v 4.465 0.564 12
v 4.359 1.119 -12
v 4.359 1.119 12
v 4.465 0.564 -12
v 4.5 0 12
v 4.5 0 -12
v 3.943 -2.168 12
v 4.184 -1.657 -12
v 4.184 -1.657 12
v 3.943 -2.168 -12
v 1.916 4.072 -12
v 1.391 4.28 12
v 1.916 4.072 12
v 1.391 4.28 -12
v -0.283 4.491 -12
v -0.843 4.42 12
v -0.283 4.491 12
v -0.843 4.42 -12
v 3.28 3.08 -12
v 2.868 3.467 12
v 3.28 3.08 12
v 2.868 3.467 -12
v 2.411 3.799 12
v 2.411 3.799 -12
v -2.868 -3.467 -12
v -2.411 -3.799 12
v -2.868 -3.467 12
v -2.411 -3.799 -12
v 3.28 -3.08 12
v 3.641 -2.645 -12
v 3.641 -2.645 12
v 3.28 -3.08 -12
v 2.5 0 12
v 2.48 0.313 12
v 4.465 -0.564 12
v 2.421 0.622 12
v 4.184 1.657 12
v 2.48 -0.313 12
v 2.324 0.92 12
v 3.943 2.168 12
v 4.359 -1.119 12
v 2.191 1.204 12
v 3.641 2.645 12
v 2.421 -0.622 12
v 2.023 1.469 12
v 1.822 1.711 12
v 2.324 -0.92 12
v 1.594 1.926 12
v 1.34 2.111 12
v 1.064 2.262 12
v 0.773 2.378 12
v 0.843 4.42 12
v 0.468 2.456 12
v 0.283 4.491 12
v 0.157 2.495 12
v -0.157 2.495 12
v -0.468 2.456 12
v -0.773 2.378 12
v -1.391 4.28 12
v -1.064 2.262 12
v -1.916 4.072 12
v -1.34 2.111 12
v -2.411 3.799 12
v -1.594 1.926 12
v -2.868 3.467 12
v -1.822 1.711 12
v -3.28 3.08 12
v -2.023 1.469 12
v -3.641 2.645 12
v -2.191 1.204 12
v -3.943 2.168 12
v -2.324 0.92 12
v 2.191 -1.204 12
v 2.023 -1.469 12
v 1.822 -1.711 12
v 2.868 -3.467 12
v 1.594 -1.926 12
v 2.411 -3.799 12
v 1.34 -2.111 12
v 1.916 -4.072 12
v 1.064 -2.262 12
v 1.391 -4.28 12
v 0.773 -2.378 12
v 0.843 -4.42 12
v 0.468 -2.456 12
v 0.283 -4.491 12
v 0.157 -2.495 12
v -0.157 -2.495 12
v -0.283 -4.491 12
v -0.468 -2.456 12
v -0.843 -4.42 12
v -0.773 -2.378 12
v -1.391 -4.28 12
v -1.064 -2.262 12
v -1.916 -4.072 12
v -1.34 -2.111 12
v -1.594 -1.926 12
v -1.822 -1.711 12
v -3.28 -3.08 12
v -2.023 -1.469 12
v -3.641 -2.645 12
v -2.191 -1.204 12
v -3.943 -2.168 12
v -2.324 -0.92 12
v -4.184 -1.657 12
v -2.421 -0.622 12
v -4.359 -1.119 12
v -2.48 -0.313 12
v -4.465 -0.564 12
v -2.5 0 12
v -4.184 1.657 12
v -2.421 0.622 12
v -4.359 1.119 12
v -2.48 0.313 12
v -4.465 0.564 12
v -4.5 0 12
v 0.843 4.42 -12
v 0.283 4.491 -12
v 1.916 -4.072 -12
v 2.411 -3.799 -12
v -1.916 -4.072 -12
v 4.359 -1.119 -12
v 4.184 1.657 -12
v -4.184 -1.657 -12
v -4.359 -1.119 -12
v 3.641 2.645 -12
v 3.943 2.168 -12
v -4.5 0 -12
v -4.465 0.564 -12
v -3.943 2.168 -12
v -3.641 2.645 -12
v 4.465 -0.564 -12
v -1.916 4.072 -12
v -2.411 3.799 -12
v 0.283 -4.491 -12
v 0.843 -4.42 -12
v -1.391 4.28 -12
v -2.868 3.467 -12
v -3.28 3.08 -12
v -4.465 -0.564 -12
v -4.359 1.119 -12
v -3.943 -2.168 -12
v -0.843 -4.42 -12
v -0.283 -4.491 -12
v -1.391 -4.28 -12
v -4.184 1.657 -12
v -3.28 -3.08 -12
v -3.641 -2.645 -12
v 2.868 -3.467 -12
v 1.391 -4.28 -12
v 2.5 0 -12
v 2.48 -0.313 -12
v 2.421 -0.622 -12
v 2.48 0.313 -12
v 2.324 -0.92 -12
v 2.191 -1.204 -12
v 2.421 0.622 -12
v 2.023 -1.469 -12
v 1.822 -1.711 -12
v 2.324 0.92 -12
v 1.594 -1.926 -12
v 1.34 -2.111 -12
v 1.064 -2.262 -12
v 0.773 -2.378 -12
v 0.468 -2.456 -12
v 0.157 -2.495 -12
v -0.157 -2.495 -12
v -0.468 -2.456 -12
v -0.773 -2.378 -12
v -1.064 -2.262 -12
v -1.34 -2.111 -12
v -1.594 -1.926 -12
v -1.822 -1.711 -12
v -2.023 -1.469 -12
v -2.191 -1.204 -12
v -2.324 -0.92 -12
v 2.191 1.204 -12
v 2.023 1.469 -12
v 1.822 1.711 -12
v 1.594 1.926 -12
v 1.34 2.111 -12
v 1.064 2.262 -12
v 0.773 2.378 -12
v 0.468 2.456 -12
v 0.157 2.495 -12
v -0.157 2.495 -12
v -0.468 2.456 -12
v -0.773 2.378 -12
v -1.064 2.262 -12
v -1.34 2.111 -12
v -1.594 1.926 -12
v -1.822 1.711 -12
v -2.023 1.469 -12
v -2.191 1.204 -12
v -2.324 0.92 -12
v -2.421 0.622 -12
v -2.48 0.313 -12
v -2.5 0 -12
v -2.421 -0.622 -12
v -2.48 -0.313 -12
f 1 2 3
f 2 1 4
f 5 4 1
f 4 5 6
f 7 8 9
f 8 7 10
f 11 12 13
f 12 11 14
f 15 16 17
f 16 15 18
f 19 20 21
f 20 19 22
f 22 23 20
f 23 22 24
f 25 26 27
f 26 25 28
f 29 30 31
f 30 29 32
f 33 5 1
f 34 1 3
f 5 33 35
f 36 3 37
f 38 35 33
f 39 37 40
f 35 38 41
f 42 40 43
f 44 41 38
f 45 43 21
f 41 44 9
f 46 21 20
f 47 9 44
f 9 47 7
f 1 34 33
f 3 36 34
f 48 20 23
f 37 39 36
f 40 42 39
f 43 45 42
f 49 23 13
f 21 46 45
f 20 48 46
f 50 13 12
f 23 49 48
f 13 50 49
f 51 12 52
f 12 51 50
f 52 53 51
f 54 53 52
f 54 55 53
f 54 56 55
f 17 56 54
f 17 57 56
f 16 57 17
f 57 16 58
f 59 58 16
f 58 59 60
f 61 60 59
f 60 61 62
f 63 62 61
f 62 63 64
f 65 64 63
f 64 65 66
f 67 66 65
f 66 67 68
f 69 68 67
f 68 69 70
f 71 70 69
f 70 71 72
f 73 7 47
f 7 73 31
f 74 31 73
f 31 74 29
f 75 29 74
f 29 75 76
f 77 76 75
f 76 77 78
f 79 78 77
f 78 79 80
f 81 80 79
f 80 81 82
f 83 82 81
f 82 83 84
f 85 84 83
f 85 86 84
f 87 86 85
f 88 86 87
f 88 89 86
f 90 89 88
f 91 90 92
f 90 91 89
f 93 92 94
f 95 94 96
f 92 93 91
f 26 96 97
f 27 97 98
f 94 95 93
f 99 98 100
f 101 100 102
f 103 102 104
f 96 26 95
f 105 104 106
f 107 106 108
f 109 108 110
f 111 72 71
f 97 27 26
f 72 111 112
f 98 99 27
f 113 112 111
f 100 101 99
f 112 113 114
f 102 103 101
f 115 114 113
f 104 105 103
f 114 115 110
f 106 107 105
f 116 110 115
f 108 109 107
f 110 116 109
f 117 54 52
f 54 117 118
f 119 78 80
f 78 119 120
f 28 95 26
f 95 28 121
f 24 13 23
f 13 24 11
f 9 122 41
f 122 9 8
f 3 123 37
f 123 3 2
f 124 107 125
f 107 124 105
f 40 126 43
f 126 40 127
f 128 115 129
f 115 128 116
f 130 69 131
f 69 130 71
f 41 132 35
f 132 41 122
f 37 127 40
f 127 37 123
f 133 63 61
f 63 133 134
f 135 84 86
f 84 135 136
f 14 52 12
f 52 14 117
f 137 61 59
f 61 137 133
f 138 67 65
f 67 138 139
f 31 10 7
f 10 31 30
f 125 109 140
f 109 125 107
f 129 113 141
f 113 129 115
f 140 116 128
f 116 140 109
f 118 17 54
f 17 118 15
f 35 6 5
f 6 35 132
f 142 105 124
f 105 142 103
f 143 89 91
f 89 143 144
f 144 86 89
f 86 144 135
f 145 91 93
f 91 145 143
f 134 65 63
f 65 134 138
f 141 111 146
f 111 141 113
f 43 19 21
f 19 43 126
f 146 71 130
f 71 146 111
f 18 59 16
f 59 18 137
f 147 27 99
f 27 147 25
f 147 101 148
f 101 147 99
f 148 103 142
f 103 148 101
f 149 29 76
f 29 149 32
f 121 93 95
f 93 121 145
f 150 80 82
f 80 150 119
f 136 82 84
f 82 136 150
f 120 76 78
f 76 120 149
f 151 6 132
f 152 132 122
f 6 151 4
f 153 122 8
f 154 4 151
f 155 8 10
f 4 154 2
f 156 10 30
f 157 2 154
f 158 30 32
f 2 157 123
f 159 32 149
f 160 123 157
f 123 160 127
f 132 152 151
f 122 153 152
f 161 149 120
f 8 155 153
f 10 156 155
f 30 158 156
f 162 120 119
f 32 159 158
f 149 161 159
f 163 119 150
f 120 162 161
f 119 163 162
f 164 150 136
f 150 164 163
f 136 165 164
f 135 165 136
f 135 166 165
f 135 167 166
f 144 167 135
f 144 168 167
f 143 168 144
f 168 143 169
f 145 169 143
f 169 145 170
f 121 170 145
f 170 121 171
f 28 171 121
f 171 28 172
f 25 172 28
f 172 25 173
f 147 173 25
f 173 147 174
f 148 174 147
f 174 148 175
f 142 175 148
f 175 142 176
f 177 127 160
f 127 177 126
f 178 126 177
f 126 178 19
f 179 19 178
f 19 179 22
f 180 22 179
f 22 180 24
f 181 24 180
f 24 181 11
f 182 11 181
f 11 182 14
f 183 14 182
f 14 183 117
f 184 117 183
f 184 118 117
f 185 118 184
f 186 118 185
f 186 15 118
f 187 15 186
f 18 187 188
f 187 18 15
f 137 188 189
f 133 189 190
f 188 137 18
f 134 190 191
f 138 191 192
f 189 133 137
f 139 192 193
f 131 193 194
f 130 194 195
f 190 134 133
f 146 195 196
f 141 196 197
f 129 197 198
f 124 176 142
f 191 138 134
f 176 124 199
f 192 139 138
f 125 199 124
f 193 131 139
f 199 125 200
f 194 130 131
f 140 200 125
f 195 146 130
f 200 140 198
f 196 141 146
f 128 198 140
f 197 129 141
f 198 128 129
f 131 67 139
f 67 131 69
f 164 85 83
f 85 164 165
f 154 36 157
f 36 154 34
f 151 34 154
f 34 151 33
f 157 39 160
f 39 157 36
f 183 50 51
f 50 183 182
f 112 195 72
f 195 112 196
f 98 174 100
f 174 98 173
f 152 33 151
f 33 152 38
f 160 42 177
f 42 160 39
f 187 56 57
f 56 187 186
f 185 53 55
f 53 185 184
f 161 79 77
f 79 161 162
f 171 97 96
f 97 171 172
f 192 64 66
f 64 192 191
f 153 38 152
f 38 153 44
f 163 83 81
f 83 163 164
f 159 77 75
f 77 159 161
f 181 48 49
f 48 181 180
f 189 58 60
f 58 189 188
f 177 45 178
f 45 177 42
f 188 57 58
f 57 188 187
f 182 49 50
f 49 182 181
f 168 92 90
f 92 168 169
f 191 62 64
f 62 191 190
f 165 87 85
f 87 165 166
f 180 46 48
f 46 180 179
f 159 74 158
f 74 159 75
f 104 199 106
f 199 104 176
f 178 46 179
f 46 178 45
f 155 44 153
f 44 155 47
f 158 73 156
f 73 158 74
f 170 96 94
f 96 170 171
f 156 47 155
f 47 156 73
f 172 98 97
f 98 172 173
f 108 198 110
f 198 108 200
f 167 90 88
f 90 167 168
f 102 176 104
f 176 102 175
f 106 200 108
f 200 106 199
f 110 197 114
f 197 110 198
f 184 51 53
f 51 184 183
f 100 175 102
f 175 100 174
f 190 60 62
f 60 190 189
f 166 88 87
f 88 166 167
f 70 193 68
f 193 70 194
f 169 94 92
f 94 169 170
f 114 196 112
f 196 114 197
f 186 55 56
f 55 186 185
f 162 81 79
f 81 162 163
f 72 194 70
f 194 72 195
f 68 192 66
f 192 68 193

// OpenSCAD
$fn = 50;


difference() {
	union() {
		translate(v = [0, 0, -12.0000000000]) {
			cylinder(h = 24, r = 4.5000000000);
		}
	}
	union() {
		translate(v = [0, 0, -100.0000000000]) {
			cylinder(h = 200, r = 2.5000000000);
		}
	}
}
